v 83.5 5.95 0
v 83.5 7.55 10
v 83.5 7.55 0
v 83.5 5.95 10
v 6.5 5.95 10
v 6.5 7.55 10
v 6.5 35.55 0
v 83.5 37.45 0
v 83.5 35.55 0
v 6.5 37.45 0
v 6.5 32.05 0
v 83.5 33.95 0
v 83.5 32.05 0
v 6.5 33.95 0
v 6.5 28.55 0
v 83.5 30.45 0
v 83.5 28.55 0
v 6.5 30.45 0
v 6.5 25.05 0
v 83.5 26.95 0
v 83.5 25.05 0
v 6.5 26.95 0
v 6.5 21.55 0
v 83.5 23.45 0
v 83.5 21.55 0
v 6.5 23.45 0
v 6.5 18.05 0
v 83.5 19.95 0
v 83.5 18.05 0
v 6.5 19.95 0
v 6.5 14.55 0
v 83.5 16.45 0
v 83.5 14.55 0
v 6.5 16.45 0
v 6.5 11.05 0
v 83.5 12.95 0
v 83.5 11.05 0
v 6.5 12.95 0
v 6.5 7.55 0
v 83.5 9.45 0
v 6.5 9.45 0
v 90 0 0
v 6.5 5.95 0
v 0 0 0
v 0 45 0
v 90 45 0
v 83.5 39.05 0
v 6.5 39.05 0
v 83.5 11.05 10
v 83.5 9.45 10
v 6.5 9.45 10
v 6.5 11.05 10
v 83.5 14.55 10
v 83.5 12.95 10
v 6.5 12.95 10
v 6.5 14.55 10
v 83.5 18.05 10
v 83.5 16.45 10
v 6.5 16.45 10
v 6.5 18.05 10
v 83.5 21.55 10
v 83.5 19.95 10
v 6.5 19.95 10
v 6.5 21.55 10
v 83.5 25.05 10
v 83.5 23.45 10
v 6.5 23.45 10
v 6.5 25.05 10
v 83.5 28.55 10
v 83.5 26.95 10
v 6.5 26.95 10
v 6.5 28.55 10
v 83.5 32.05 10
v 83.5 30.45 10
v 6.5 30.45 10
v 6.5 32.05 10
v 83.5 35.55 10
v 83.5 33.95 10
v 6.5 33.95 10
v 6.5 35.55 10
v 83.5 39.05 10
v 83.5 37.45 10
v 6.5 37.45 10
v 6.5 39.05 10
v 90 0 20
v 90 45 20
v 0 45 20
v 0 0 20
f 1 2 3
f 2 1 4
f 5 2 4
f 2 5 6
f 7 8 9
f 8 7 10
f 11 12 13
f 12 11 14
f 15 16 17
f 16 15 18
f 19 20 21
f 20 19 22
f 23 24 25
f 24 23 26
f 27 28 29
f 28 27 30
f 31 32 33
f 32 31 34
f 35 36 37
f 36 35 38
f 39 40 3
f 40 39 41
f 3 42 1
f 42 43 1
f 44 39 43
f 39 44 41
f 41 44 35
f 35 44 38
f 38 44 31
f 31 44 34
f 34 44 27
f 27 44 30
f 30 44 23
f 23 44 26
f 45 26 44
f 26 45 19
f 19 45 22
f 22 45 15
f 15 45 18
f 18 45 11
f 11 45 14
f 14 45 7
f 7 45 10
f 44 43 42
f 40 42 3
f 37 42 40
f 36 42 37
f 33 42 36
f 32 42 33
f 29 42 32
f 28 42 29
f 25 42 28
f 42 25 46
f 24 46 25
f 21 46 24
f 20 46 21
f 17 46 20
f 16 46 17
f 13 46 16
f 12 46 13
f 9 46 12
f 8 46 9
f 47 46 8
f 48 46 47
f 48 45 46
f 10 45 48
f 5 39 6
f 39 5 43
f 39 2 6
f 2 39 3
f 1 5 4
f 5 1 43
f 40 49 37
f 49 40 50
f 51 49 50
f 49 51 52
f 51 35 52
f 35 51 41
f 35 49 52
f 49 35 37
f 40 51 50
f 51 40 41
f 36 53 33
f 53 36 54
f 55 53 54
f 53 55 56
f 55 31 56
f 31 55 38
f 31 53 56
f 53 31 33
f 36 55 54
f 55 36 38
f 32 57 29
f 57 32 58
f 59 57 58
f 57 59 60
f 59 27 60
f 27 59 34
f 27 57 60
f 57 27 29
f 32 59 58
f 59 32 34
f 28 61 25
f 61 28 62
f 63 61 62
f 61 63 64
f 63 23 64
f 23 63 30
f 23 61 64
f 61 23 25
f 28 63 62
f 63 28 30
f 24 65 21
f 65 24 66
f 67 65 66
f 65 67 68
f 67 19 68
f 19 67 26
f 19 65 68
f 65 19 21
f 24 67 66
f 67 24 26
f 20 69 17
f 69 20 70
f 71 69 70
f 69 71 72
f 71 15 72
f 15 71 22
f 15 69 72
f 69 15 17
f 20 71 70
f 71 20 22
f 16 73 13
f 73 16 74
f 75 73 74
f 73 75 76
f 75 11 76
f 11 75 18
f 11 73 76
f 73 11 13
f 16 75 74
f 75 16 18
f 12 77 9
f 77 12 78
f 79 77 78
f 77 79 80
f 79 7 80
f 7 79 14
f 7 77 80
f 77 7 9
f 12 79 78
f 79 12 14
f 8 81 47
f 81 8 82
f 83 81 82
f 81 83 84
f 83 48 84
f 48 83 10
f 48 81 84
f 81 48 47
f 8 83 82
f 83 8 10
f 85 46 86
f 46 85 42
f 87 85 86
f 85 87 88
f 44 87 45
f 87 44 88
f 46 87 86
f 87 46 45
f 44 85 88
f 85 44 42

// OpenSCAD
$fn = 64;

block_length = 90;
block_width = 45;
block_height = 20;
slot_length = 77;
slot_width = 1.6;
slot_depth = 10;
slot_spacing = 3.5;
n = 10;

total_span = (slot_spacing * (n - 1)) + slot_width;
start_y = (block_width - total_span) / 2;

difference() {
    cube([block_length, block_width, block_height]);
    for (i = [0:n-1]) {
        translate([ (block_length - slot_length)/2, start_y + i * slot_spacing, 0 ])
        cube([slot_length, slot_width, slot_depth]);
    }
}
